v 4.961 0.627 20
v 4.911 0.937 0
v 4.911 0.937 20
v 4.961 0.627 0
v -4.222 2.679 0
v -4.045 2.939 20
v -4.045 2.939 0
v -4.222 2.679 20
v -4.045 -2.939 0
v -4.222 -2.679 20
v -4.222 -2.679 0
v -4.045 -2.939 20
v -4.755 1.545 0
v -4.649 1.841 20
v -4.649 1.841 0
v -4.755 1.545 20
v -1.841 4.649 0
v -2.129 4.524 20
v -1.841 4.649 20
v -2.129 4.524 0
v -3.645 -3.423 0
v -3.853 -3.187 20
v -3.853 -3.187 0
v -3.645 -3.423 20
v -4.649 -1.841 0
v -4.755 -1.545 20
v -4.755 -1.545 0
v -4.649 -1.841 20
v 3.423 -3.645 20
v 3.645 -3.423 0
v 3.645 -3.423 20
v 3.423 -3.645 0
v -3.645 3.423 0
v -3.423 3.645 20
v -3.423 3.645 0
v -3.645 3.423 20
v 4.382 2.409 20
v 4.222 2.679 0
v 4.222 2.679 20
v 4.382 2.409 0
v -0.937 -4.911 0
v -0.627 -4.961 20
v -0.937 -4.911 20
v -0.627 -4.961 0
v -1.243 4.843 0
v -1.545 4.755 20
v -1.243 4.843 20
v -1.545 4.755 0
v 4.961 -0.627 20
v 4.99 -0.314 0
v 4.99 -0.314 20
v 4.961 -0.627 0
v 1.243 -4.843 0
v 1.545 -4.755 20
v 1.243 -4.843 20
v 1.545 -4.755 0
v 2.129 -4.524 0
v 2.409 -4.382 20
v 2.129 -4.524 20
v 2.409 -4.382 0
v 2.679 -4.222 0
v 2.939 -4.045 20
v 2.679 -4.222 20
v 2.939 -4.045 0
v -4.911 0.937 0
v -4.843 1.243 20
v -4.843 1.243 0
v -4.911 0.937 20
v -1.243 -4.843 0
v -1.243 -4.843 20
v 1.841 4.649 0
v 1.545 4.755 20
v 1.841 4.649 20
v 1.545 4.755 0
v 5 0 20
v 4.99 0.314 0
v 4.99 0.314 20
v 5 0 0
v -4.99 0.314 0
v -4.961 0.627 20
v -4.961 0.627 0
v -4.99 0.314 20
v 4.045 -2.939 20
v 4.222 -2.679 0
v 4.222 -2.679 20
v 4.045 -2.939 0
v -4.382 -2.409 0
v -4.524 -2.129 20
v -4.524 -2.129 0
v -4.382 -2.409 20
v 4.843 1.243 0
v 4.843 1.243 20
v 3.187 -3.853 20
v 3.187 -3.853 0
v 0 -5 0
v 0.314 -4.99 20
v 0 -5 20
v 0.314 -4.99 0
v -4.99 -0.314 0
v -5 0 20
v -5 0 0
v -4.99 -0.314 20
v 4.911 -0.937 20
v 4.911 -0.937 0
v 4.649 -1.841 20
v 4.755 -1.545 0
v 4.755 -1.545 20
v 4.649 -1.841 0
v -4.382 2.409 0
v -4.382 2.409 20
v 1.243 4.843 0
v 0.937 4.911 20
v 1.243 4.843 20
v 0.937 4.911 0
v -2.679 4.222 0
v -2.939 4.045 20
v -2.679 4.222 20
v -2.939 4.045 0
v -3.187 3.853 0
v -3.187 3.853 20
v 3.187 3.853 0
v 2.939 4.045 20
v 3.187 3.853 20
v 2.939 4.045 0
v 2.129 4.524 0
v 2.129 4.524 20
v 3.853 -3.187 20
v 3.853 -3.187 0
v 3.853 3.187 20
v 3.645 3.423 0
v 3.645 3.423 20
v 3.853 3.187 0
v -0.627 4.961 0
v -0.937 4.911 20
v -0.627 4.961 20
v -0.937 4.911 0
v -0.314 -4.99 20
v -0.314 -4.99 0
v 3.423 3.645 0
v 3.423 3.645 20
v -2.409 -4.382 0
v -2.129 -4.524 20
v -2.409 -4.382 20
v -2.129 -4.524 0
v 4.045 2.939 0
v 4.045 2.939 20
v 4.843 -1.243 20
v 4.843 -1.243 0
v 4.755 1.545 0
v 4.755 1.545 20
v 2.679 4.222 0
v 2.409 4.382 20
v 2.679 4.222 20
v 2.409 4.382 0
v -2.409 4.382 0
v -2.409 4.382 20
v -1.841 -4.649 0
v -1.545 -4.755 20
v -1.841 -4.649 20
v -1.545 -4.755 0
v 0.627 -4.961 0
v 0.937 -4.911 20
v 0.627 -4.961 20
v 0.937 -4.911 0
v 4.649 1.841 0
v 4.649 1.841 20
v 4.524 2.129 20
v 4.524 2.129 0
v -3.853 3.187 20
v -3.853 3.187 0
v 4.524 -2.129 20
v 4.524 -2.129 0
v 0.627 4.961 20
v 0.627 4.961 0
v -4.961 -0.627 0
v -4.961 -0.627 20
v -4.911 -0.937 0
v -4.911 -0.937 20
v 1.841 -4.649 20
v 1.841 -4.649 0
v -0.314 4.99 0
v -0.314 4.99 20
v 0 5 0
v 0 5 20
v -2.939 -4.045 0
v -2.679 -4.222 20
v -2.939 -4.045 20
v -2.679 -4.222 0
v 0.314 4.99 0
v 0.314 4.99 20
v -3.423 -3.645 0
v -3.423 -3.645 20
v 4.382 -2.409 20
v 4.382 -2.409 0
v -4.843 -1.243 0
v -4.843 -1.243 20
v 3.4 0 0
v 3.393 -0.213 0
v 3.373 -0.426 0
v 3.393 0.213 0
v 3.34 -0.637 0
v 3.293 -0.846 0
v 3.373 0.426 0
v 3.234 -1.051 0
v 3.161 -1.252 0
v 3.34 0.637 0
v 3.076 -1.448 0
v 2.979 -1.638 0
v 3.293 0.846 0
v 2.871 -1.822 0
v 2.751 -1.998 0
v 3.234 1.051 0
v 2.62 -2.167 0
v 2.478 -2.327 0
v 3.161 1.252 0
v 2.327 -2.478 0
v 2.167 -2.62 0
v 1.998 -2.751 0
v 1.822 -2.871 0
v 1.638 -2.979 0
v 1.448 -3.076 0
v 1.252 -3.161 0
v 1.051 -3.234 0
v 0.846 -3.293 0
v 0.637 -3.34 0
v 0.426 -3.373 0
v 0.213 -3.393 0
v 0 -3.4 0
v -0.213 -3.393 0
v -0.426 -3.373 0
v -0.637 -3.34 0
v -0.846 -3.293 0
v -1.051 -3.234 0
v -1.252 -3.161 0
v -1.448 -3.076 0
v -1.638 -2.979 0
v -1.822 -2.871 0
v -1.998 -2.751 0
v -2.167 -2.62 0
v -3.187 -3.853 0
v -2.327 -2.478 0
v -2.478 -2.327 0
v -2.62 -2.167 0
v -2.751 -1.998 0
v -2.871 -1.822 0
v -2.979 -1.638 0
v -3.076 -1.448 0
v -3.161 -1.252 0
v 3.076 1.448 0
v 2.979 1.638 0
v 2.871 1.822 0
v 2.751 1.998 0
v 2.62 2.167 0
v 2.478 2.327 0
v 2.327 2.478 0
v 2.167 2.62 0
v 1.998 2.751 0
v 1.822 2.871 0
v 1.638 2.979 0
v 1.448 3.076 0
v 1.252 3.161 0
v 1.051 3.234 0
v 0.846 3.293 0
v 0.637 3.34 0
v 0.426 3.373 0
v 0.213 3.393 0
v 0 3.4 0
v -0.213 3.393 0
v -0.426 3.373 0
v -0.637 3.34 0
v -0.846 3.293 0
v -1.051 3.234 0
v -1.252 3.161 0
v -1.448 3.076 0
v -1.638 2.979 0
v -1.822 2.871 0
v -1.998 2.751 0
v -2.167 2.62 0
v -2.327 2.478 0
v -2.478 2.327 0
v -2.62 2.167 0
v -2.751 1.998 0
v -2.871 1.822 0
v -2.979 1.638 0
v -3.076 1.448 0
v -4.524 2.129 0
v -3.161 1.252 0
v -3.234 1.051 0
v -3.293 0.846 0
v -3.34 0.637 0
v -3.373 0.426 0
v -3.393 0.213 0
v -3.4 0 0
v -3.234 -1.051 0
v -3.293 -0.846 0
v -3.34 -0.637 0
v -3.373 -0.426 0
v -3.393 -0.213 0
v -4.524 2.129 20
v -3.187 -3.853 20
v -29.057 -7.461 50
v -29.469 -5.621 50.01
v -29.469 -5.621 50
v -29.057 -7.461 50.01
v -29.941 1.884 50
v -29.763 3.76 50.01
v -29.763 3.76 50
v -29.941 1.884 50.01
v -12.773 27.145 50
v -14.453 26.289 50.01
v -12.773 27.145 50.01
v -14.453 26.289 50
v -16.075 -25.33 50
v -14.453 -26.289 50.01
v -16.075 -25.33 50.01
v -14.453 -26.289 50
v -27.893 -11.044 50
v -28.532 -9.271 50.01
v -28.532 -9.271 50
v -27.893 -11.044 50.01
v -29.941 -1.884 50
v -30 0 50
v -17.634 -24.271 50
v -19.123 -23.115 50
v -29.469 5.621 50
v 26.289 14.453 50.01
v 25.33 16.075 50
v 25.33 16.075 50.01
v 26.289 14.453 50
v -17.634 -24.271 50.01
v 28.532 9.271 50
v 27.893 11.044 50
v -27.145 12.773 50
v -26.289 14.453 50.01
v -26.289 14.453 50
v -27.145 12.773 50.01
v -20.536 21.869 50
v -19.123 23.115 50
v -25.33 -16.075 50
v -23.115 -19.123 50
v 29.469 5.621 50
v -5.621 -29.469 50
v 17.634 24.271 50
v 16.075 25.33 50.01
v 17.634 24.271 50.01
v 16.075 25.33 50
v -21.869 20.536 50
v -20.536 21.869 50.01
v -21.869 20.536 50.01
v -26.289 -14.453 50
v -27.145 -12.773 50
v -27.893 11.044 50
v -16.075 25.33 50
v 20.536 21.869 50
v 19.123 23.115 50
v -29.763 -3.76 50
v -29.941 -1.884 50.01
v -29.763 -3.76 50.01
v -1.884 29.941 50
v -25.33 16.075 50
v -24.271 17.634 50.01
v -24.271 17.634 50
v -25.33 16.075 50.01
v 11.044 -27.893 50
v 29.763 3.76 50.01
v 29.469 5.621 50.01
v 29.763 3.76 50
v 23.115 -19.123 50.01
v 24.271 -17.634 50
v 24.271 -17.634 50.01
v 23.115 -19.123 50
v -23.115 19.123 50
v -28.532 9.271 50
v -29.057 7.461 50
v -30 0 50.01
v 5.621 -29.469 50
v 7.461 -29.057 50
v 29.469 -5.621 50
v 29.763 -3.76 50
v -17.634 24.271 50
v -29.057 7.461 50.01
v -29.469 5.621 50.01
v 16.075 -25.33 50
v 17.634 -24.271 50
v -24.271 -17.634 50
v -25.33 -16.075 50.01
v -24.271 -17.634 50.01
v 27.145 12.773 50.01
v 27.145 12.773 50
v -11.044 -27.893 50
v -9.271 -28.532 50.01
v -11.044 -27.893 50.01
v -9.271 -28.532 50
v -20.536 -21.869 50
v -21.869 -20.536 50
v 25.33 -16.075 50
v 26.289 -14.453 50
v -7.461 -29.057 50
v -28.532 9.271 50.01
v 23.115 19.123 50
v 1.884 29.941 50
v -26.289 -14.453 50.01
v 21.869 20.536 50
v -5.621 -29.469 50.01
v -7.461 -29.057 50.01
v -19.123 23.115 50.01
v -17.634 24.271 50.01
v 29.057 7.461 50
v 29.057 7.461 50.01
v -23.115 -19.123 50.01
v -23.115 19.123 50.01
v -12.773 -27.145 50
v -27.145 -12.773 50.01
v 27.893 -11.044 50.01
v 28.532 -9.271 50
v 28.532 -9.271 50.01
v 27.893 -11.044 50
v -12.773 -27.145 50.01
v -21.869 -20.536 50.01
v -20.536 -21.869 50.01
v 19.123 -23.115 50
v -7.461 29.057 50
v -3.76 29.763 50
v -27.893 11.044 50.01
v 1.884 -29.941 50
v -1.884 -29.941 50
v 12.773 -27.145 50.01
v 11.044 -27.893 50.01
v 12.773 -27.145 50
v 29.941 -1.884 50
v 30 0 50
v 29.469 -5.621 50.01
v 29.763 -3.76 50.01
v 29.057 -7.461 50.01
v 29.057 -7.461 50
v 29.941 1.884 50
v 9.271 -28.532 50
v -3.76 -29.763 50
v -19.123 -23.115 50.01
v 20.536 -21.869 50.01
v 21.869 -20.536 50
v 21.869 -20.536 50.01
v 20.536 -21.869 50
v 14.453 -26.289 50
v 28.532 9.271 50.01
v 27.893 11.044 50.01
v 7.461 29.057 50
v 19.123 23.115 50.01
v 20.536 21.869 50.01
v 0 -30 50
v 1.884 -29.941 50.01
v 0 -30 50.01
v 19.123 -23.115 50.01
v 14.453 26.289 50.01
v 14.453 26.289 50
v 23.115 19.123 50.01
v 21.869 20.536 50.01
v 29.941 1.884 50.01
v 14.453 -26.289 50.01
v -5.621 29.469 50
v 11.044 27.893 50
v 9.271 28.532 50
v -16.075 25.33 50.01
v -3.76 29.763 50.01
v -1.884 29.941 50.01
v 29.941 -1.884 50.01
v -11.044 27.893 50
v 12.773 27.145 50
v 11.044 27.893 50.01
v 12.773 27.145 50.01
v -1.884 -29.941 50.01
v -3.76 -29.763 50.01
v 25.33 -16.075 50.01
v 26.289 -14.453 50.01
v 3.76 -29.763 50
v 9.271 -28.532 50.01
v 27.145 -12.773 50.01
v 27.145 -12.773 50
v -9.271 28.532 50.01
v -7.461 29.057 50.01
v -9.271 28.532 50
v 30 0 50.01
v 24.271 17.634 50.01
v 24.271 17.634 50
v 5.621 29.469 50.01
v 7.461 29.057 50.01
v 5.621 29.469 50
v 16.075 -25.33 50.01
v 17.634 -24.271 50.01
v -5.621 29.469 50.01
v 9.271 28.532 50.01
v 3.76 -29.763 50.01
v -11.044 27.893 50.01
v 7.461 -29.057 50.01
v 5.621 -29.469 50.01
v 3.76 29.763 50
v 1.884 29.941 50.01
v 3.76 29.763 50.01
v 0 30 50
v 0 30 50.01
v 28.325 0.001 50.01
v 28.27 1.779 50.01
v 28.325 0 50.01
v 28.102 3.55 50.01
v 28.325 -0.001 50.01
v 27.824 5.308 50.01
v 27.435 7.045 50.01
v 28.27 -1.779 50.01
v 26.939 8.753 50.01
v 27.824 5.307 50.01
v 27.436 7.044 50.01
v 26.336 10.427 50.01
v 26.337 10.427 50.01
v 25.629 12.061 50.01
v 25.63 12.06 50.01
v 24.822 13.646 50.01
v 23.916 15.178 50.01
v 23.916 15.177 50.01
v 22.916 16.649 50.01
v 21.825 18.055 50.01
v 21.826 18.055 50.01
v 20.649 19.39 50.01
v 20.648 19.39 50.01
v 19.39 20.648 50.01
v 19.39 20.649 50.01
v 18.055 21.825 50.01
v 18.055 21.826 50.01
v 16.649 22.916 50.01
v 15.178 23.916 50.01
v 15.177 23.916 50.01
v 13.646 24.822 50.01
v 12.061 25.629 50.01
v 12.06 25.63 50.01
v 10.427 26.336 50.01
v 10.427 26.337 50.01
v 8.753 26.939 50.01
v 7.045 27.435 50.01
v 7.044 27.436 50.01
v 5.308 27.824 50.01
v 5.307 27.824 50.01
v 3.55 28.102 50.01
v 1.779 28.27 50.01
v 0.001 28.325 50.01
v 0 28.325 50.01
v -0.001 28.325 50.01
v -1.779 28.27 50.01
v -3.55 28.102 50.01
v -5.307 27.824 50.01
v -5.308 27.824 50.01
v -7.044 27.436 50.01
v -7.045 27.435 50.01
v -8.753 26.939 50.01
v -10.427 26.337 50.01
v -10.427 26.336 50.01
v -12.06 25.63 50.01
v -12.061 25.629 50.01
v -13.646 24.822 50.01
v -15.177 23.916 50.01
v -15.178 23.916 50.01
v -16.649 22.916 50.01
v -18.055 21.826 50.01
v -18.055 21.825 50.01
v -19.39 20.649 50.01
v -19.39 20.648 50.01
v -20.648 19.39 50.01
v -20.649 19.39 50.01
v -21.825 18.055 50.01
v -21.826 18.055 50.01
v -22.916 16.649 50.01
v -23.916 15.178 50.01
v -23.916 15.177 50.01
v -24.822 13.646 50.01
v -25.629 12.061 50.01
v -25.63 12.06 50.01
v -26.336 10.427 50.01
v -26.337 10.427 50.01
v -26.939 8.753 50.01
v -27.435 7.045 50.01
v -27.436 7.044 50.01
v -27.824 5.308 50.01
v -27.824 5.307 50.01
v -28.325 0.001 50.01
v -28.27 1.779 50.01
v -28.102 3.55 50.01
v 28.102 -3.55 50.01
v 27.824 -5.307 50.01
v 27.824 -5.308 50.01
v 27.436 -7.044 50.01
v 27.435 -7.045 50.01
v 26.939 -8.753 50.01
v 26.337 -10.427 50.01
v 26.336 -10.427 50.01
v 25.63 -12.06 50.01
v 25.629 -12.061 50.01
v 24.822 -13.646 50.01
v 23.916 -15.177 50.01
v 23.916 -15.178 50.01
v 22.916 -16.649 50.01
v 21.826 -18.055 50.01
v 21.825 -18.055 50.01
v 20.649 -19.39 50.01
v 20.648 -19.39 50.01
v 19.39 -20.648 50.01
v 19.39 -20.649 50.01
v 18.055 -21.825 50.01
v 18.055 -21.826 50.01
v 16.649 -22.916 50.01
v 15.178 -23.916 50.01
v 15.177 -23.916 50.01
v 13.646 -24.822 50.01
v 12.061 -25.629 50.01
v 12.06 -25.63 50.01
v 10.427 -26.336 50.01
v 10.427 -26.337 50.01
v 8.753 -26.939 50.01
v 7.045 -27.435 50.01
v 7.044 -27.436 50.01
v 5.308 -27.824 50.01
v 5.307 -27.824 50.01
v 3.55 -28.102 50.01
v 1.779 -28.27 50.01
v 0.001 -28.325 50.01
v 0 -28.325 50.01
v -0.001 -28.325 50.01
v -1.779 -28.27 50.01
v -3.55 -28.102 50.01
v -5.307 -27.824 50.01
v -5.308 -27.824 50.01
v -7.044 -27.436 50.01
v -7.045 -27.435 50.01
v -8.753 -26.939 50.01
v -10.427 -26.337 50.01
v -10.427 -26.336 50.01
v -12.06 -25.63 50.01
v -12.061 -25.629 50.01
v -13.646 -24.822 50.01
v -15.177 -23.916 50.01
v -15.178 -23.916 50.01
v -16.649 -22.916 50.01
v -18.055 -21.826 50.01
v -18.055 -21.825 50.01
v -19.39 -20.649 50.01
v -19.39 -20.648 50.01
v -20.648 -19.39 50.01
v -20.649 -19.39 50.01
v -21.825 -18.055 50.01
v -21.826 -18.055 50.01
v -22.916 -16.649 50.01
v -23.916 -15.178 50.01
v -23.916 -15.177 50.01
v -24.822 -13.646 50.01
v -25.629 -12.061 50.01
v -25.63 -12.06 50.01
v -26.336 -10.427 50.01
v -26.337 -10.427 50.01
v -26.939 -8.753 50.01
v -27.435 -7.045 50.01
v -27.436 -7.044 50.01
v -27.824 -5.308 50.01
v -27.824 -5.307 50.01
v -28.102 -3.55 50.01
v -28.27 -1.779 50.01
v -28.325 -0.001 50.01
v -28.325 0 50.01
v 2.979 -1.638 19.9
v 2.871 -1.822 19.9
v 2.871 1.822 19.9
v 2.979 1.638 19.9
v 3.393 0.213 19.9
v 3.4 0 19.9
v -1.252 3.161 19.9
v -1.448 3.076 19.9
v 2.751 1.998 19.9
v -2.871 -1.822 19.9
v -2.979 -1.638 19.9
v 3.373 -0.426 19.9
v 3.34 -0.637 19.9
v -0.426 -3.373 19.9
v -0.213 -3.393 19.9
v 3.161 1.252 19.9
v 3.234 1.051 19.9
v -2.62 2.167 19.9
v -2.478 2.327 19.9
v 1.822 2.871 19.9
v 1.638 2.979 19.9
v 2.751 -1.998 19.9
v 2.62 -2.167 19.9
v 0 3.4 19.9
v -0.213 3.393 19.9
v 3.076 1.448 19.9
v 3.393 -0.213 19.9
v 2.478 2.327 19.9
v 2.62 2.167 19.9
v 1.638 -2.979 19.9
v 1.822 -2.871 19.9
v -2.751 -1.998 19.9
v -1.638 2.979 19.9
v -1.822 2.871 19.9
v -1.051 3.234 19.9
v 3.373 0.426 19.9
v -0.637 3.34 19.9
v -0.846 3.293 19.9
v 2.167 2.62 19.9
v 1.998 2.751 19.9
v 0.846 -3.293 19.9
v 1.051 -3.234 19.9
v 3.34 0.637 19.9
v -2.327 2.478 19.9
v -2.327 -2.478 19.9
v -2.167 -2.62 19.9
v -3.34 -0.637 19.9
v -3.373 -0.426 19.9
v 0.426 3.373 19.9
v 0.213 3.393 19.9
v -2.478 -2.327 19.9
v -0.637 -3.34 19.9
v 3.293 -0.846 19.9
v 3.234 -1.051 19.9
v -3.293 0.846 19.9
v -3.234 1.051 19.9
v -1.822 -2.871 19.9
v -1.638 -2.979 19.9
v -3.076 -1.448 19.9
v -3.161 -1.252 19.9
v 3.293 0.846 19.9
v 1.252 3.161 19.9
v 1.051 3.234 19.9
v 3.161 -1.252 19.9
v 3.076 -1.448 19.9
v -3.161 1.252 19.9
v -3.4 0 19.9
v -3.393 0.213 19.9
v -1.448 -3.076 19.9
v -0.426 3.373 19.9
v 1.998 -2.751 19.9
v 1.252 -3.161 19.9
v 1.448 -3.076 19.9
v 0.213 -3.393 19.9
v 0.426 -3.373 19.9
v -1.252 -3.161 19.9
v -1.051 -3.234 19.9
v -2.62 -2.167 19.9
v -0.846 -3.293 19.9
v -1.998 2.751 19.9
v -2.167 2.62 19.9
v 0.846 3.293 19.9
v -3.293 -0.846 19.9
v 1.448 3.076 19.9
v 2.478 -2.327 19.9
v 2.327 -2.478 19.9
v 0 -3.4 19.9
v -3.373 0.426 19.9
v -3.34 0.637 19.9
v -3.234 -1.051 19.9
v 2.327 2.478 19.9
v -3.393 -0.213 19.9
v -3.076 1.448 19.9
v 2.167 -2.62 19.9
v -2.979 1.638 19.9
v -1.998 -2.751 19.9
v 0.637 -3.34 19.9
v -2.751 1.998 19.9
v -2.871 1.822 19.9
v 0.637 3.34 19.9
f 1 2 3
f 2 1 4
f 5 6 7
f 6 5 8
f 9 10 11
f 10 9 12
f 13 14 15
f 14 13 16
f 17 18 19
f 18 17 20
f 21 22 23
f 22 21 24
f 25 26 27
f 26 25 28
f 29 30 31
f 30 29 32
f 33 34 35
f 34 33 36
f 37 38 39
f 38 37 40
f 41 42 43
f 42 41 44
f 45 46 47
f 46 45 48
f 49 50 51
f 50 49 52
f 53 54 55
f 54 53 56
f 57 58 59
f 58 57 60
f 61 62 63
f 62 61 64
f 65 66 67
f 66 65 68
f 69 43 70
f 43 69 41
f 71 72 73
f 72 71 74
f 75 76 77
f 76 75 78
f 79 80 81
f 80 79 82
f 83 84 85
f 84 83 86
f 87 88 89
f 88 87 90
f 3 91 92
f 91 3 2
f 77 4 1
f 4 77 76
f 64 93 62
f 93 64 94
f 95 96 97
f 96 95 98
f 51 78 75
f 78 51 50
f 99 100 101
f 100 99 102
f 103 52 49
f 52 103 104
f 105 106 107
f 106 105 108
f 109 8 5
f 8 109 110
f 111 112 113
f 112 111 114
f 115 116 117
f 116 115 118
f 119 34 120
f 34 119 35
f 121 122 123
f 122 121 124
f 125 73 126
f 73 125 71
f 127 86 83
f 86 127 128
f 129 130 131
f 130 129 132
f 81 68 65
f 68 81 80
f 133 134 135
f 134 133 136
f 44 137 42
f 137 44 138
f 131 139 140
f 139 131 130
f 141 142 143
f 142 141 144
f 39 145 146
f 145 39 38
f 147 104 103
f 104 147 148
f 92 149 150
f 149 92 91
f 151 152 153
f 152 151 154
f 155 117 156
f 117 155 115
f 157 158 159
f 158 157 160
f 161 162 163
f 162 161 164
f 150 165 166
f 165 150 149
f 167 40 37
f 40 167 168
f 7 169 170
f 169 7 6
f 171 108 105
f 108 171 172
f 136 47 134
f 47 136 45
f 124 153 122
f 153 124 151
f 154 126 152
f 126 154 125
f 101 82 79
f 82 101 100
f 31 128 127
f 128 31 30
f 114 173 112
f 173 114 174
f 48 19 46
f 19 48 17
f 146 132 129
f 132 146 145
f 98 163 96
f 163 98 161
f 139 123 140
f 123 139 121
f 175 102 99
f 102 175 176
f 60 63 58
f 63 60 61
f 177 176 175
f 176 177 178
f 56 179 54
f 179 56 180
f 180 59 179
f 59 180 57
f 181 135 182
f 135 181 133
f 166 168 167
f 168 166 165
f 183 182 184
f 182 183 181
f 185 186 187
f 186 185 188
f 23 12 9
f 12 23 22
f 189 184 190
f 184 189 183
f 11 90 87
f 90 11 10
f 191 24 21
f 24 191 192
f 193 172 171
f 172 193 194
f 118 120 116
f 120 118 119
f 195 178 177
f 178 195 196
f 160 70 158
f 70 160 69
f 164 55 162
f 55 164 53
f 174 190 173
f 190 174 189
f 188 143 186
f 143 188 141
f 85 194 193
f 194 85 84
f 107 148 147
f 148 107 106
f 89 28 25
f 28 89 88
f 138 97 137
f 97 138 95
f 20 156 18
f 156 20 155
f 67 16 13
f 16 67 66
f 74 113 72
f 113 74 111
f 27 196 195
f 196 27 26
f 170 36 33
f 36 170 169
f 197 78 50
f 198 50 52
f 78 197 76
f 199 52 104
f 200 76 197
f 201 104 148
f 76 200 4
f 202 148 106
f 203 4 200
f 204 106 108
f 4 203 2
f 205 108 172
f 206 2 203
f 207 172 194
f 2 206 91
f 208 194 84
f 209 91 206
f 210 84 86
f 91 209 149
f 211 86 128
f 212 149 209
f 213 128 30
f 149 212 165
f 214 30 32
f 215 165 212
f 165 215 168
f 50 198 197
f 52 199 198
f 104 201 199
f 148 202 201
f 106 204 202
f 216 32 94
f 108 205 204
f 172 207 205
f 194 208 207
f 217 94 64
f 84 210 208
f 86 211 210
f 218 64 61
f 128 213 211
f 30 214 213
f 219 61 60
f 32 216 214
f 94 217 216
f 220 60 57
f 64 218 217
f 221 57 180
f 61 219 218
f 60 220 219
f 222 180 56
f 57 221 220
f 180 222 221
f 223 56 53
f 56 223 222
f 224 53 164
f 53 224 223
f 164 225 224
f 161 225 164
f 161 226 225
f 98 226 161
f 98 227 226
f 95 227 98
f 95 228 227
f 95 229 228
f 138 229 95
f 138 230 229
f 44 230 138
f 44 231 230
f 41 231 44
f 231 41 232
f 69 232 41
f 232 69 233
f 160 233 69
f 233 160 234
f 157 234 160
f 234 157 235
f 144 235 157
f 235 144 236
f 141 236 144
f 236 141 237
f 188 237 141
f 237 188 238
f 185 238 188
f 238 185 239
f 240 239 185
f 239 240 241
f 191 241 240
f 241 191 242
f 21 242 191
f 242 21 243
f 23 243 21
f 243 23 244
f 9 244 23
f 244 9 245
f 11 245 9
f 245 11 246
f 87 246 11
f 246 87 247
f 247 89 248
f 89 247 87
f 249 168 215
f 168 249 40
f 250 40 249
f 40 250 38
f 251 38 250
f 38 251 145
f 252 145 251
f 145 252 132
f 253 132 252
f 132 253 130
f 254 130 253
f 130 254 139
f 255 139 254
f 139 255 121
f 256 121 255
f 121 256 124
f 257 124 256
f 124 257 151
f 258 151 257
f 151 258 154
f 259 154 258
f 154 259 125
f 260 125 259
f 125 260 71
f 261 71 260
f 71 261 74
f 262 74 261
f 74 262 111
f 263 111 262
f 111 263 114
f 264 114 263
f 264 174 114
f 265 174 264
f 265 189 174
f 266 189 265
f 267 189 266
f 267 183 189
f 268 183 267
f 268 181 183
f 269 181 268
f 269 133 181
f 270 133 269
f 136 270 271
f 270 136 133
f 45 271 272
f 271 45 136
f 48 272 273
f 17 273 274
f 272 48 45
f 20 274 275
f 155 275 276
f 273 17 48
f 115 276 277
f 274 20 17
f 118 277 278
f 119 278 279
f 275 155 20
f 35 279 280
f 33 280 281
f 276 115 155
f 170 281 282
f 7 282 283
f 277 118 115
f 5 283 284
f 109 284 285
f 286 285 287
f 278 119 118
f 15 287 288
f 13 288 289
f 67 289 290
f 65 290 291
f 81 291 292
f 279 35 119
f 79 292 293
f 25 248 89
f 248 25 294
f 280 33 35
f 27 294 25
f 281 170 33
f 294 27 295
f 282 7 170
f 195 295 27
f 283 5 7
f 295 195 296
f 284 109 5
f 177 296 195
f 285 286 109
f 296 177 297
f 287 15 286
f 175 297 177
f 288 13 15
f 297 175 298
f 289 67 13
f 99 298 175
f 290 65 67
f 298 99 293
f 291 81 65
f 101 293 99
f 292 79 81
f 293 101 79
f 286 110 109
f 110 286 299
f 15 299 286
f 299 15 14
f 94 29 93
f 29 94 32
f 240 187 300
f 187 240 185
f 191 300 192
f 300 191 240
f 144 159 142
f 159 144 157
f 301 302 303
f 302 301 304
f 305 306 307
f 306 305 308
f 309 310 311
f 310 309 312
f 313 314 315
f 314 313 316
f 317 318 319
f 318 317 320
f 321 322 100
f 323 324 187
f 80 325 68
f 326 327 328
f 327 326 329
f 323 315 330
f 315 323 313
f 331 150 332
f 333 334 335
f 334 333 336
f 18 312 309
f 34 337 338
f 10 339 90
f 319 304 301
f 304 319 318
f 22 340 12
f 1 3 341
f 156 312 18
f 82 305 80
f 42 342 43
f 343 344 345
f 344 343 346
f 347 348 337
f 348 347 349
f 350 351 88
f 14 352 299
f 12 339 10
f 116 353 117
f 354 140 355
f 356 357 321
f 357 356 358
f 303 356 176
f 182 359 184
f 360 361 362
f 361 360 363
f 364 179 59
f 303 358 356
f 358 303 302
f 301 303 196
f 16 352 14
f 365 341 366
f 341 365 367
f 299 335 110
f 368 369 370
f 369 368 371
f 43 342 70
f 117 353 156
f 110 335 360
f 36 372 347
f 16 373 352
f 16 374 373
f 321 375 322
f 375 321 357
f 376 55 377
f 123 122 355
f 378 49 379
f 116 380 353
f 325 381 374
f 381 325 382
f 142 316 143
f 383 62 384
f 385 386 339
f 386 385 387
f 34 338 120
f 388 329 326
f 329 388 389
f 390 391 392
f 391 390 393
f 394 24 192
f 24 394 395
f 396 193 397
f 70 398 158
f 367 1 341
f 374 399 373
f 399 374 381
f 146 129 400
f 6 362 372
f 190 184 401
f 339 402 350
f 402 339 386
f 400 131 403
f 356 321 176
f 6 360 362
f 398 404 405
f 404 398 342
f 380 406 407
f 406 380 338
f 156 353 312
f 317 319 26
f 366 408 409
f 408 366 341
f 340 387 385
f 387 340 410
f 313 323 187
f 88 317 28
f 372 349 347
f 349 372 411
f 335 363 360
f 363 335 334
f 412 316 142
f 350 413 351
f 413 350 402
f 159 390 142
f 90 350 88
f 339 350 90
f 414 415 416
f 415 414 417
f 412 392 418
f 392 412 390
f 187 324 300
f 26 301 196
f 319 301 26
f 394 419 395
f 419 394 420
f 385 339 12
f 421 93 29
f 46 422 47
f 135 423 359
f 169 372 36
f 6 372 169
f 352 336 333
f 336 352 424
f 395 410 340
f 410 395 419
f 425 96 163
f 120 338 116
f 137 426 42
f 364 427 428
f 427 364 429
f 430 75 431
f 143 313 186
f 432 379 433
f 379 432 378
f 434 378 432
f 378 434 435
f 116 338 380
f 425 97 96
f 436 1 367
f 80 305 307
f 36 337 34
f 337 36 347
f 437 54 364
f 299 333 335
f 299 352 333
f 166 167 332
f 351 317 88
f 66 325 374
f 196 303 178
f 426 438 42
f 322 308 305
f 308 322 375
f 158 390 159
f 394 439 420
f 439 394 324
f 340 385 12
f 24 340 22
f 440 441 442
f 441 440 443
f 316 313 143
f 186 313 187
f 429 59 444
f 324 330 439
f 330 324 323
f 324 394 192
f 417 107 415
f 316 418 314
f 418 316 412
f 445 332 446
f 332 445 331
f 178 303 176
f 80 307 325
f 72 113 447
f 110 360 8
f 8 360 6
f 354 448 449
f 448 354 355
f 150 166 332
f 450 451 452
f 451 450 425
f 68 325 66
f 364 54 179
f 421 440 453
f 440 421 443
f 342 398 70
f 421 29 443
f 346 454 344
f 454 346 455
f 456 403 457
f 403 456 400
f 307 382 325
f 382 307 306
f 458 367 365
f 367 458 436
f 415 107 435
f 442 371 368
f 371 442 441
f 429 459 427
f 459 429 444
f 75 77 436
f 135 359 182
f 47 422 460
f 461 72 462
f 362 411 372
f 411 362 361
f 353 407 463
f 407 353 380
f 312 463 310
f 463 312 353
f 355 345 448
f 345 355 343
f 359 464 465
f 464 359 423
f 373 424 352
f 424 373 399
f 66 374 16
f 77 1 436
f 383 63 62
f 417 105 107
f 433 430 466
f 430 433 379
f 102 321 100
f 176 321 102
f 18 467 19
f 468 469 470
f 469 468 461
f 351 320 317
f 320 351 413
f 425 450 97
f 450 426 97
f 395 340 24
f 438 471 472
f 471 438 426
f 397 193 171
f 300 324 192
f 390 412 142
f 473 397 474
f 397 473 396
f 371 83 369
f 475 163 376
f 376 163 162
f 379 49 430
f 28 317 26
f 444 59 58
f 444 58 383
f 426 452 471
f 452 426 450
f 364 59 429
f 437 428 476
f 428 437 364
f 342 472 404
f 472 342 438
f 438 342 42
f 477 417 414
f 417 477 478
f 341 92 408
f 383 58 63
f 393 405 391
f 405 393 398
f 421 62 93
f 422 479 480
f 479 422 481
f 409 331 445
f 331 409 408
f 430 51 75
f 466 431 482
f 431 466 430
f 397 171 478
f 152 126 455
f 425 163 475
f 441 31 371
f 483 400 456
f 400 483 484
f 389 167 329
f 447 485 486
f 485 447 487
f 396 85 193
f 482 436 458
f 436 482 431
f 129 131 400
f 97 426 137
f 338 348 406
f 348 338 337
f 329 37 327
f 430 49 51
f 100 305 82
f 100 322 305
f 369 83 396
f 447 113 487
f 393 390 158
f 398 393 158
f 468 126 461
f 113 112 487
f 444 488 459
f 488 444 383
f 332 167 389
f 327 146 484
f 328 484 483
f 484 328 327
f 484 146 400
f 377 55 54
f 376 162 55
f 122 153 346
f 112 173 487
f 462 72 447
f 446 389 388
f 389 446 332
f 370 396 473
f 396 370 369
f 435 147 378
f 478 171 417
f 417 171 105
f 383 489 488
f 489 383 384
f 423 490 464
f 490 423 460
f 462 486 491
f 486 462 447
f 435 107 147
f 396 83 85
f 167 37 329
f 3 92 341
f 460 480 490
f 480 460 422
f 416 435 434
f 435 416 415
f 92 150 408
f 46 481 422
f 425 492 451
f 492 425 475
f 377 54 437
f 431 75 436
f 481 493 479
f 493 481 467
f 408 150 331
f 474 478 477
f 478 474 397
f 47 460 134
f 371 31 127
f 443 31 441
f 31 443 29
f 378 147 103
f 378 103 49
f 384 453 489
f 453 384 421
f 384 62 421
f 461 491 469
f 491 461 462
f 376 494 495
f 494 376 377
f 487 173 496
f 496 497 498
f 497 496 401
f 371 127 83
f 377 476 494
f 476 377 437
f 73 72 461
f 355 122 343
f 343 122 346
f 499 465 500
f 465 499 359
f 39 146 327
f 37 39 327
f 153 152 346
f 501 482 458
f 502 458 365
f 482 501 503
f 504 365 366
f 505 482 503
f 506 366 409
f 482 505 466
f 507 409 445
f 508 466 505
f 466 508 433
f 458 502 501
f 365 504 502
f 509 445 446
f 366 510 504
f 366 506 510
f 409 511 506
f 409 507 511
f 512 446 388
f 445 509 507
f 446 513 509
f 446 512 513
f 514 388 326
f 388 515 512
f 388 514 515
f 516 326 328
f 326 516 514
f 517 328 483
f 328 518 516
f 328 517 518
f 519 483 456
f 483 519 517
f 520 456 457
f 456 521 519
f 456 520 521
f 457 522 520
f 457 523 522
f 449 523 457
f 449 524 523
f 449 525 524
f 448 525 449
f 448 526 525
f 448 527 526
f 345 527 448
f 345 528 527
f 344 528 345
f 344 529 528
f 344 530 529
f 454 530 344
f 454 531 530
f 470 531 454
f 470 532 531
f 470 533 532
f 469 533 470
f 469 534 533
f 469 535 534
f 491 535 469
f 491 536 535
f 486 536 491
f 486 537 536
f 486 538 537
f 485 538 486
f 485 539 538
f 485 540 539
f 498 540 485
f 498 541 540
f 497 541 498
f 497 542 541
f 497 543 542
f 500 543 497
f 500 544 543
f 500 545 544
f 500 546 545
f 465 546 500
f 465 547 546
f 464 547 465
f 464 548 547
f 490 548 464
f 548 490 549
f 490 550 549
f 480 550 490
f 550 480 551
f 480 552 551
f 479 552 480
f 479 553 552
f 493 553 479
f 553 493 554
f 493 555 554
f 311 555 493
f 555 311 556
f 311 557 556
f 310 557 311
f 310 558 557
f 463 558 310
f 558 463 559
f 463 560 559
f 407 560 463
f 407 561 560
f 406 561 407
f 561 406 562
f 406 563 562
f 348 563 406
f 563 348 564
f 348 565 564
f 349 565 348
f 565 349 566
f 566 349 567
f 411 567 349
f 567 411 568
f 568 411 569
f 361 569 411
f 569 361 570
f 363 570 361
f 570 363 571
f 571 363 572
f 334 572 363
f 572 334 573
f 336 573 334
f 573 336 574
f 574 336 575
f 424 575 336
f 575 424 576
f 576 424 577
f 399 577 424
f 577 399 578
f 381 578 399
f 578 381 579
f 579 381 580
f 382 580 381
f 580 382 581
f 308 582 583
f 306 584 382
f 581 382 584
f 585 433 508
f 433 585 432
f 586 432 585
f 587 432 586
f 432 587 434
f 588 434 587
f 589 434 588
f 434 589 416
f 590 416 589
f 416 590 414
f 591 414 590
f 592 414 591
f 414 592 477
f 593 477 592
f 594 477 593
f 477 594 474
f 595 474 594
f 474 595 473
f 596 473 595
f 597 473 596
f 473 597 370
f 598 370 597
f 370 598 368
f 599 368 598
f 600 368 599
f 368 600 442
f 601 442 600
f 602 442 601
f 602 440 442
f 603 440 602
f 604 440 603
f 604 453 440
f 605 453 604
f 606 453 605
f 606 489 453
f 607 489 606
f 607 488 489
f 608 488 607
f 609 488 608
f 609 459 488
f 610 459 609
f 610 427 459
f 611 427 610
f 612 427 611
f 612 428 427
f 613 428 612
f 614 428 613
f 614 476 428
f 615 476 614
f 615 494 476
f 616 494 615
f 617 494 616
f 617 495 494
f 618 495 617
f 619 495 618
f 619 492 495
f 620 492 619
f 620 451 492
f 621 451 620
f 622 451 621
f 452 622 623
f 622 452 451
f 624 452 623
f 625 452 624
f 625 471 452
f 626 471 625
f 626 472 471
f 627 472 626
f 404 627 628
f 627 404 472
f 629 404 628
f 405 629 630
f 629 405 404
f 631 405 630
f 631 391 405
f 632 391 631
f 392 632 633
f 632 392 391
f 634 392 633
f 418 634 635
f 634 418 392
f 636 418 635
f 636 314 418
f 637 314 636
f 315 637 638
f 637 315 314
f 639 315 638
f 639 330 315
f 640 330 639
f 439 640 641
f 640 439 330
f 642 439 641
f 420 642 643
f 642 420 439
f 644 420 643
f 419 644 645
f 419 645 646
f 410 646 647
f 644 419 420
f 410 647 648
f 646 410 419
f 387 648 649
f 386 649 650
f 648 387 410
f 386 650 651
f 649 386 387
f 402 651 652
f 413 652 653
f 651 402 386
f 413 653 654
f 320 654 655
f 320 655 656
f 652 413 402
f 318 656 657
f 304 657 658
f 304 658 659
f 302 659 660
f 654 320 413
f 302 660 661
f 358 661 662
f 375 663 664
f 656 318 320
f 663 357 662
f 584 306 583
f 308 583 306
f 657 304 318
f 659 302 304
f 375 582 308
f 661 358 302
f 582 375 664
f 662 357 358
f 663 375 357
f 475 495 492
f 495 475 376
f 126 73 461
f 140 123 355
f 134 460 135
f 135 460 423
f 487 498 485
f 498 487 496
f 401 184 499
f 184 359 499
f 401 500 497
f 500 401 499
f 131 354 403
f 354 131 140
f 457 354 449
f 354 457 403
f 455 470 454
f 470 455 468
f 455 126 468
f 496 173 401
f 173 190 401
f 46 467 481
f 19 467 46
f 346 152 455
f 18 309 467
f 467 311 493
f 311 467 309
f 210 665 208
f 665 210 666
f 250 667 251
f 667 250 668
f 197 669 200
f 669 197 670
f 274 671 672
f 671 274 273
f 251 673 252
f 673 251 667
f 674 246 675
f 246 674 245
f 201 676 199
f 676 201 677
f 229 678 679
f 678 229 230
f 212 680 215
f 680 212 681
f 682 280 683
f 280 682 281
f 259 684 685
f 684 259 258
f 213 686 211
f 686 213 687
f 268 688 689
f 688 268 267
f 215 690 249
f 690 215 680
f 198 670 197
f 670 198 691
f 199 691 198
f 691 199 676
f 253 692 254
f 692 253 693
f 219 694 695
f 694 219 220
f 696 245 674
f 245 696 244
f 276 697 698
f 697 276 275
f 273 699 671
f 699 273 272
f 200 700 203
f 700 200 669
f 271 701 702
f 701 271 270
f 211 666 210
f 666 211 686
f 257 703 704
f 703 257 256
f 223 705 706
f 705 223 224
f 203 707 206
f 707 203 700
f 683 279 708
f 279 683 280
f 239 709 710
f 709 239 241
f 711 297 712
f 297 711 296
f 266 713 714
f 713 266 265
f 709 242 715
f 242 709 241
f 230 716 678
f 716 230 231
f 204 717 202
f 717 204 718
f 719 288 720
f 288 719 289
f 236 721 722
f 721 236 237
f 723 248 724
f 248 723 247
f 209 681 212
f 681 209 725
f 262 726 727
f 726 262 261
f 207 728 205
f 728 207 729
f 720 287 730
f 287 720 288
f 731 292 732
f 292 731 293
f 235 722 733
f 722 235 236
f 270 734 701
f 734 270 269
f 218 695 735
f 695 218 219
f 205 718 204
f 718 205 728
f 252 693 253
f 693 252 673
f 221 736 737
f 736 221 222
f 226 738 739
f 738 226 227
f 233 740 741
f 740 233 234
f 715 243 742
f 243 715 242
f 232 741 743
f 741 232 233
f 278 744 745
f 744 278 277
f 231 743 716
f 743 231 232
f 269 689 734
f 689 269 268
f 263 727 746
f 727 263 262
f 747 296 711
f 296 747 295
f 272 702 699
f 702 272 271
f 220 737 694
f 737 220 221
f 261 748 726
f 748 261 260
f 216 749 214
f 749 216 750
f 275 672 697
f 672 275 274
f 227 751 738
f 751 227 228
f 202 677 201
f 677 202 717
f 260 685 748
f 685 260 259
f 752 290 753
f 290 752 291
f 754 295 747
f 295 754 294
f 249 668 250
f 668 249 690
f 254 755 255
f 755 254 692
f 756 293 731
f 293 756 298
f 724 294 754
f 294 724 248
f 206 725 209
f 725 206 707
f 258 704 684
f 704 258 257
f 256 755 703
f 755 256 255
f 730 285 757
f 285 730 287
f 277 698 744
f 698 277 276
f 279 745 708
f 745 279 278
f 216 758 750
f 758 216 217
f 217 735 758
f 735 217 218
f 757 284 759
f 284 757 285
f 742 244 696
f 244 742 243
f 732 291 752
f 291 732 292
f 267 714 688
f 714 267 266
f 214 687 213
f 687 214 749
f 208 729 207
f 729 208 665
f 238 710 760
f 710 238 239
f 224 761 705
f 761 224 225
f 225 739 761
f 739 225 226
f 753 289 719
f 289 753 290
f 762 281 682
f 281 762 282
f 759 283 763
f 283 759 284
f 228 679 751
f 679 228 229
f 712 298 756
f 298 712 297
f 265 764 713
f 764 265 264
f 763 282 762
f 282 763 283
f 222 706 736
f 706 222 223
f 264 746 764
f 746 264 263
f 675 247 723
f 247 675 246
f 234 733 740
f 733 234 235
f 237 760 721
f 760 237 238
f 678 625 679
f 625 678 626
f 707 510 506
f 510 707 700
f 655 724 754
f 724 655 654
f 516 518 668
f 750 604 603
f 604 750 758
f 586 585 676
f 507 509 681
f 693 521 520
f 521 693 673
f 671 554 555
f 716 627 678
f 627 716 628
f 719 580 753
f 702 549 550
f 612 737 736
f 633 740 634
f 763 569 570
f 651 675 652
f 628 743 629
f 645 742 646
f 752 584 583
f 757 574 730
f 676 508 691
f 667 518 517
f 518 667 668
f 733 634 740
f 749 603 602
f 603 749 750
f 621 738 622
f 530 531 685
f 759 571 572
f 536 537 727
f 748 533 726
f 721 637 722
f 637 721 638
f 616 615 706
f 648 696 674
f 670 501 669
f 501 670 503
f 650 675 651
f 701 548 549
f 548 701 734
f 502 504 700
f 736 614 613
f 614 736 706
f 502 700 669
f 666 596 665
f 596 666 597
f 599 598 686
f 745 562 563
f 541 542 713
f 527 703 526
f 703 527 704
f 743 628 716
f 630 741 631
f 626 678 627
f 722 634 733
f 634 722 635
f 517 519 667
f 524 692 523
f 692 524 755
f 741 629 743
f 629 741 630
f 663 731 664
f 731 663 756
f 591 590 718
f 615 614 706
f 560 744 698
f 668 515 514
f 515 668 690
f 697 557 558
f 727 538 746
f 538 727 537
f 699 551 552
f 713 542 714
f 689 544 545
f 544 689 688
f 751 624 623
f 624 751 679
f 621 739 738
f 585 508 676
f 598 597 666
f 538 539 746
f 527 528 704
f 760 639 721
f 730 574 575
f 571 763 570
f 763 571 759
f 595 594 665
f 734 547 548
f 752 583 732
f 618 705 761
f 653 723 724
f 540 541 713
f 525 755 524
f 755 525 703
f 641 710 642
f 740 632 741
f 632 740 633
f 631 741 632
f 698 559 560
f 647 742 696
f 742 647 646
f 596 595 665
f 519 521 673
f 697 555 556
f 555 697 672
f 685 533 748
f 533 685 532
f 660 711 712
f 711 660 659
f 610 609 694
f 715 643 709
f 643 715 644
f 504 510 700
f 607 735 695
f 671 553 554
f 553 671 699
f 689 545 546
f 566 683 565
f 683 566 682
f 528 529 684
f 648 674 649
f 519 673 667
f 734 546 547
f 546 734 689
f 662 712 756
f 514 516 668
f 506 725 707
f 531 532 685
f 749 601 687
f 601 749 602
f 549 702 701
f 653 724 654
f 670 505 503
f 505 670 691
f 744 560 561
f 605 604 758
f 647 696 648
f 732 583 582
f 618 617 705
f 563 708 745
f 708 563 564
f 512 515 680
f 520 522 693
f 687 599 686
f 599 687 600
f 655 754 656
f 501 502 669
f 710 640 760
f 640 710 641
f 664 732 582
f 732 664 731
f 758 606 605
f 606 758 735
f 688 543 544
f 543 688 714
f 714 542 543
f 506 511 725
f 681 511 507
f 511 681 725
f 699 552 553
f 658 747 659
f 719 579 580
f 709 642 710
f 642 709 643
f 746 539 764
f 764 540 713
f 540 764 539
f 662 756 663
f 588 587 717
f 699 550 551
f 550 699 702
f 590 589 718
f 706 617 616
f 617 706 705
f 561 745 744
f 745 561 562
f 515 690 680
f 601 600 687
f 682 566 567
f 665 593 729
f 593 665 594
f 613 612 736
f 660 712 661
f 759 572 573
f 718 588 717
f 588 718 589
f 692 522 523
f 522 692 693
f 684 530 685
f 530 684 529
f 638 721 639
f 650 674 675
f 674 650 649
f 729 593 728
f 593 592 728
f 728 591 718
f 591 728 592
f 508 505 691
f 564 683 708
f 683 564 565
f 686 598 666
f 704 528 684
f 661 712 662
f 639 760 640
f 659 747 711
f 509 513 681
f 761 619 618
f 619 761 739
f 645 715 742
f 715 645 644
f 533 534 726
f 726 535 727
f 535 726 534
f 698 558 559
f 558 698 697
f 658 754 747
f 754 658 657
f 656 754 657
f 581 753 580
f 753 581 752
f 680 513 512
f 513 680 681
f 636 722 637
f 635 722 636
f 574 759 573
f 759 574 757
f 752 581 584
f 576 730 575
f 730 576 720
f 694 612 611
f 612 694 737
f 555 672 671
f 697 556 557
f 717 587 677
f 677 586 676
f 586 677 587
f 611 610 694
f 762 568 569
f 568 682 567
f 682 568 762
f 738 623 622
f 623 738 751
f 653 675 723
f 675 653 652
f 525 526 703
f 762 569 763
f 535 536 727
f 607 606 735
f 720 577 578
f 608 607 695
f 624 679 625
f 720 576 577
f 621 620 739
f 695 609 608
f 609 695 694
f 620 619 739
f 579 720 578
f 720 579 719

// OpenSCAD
// Small Lab Funnel
// Printed upright, wide opening at top.

// Dimensions
spout_od    = 10.0;      // Outer diameter of the spout (mm)
spout_h     = 20.0;      // Height of the spout (mm)
rim_od      = 60.0;      // Outer diameter at the top rim (mm)
funnel_h    = 30.0;      // Height of the conical section (50mm total - 20mm spout)
wall_thick  = 1.6;       // Wall thickness (mm)

$fn = 100;

// Calculated internal dimensions
spout_id    = spout_od - (2 * wall_thick);
rim_id      = rim_od - (2 * wall_thick);

// The total height is spout_h + funnel_h = 50mm
// The spout goes from z=0 to z=20
// The cone goes from z=20 to z=50

module funnel_body() {
    difference() {
        // Outer Shell
        union() {
            // Spout outer cylinder
            cylinder(h = spout_h, d = spout_od);
            
            // Funnel cone outer shape
            // We use a hull of two cylinders to create the conical transition
            hull() {
                translate([0, 0, spout_h]) 
                    cylinder(h = 0.01, d = spout_od);
                translate([0, 0, spout_h + funnel_h]) 
                    cylinder(h = 0.01, d = rim_od);
            }
        }

        // Inner Void (The hollow part)
        union() {
            // Spout inner hole
            translate([0, 0, -1]) 
                cylinder(h = spout_h + 2, d = spout_id);
            
            // Funnel inner cone hole
            hull() {
                translate([0, 0, spout_h - 0.1]) 
                    cylinder(h = 0.1, d = spout_id);
                translate([0, 0, spout_h + funnel_h + 0.1]) 
                    cylinder(h = 0.1, d = rim_id);
            }
        }
    }
}

// Render the part
funnel_body();
